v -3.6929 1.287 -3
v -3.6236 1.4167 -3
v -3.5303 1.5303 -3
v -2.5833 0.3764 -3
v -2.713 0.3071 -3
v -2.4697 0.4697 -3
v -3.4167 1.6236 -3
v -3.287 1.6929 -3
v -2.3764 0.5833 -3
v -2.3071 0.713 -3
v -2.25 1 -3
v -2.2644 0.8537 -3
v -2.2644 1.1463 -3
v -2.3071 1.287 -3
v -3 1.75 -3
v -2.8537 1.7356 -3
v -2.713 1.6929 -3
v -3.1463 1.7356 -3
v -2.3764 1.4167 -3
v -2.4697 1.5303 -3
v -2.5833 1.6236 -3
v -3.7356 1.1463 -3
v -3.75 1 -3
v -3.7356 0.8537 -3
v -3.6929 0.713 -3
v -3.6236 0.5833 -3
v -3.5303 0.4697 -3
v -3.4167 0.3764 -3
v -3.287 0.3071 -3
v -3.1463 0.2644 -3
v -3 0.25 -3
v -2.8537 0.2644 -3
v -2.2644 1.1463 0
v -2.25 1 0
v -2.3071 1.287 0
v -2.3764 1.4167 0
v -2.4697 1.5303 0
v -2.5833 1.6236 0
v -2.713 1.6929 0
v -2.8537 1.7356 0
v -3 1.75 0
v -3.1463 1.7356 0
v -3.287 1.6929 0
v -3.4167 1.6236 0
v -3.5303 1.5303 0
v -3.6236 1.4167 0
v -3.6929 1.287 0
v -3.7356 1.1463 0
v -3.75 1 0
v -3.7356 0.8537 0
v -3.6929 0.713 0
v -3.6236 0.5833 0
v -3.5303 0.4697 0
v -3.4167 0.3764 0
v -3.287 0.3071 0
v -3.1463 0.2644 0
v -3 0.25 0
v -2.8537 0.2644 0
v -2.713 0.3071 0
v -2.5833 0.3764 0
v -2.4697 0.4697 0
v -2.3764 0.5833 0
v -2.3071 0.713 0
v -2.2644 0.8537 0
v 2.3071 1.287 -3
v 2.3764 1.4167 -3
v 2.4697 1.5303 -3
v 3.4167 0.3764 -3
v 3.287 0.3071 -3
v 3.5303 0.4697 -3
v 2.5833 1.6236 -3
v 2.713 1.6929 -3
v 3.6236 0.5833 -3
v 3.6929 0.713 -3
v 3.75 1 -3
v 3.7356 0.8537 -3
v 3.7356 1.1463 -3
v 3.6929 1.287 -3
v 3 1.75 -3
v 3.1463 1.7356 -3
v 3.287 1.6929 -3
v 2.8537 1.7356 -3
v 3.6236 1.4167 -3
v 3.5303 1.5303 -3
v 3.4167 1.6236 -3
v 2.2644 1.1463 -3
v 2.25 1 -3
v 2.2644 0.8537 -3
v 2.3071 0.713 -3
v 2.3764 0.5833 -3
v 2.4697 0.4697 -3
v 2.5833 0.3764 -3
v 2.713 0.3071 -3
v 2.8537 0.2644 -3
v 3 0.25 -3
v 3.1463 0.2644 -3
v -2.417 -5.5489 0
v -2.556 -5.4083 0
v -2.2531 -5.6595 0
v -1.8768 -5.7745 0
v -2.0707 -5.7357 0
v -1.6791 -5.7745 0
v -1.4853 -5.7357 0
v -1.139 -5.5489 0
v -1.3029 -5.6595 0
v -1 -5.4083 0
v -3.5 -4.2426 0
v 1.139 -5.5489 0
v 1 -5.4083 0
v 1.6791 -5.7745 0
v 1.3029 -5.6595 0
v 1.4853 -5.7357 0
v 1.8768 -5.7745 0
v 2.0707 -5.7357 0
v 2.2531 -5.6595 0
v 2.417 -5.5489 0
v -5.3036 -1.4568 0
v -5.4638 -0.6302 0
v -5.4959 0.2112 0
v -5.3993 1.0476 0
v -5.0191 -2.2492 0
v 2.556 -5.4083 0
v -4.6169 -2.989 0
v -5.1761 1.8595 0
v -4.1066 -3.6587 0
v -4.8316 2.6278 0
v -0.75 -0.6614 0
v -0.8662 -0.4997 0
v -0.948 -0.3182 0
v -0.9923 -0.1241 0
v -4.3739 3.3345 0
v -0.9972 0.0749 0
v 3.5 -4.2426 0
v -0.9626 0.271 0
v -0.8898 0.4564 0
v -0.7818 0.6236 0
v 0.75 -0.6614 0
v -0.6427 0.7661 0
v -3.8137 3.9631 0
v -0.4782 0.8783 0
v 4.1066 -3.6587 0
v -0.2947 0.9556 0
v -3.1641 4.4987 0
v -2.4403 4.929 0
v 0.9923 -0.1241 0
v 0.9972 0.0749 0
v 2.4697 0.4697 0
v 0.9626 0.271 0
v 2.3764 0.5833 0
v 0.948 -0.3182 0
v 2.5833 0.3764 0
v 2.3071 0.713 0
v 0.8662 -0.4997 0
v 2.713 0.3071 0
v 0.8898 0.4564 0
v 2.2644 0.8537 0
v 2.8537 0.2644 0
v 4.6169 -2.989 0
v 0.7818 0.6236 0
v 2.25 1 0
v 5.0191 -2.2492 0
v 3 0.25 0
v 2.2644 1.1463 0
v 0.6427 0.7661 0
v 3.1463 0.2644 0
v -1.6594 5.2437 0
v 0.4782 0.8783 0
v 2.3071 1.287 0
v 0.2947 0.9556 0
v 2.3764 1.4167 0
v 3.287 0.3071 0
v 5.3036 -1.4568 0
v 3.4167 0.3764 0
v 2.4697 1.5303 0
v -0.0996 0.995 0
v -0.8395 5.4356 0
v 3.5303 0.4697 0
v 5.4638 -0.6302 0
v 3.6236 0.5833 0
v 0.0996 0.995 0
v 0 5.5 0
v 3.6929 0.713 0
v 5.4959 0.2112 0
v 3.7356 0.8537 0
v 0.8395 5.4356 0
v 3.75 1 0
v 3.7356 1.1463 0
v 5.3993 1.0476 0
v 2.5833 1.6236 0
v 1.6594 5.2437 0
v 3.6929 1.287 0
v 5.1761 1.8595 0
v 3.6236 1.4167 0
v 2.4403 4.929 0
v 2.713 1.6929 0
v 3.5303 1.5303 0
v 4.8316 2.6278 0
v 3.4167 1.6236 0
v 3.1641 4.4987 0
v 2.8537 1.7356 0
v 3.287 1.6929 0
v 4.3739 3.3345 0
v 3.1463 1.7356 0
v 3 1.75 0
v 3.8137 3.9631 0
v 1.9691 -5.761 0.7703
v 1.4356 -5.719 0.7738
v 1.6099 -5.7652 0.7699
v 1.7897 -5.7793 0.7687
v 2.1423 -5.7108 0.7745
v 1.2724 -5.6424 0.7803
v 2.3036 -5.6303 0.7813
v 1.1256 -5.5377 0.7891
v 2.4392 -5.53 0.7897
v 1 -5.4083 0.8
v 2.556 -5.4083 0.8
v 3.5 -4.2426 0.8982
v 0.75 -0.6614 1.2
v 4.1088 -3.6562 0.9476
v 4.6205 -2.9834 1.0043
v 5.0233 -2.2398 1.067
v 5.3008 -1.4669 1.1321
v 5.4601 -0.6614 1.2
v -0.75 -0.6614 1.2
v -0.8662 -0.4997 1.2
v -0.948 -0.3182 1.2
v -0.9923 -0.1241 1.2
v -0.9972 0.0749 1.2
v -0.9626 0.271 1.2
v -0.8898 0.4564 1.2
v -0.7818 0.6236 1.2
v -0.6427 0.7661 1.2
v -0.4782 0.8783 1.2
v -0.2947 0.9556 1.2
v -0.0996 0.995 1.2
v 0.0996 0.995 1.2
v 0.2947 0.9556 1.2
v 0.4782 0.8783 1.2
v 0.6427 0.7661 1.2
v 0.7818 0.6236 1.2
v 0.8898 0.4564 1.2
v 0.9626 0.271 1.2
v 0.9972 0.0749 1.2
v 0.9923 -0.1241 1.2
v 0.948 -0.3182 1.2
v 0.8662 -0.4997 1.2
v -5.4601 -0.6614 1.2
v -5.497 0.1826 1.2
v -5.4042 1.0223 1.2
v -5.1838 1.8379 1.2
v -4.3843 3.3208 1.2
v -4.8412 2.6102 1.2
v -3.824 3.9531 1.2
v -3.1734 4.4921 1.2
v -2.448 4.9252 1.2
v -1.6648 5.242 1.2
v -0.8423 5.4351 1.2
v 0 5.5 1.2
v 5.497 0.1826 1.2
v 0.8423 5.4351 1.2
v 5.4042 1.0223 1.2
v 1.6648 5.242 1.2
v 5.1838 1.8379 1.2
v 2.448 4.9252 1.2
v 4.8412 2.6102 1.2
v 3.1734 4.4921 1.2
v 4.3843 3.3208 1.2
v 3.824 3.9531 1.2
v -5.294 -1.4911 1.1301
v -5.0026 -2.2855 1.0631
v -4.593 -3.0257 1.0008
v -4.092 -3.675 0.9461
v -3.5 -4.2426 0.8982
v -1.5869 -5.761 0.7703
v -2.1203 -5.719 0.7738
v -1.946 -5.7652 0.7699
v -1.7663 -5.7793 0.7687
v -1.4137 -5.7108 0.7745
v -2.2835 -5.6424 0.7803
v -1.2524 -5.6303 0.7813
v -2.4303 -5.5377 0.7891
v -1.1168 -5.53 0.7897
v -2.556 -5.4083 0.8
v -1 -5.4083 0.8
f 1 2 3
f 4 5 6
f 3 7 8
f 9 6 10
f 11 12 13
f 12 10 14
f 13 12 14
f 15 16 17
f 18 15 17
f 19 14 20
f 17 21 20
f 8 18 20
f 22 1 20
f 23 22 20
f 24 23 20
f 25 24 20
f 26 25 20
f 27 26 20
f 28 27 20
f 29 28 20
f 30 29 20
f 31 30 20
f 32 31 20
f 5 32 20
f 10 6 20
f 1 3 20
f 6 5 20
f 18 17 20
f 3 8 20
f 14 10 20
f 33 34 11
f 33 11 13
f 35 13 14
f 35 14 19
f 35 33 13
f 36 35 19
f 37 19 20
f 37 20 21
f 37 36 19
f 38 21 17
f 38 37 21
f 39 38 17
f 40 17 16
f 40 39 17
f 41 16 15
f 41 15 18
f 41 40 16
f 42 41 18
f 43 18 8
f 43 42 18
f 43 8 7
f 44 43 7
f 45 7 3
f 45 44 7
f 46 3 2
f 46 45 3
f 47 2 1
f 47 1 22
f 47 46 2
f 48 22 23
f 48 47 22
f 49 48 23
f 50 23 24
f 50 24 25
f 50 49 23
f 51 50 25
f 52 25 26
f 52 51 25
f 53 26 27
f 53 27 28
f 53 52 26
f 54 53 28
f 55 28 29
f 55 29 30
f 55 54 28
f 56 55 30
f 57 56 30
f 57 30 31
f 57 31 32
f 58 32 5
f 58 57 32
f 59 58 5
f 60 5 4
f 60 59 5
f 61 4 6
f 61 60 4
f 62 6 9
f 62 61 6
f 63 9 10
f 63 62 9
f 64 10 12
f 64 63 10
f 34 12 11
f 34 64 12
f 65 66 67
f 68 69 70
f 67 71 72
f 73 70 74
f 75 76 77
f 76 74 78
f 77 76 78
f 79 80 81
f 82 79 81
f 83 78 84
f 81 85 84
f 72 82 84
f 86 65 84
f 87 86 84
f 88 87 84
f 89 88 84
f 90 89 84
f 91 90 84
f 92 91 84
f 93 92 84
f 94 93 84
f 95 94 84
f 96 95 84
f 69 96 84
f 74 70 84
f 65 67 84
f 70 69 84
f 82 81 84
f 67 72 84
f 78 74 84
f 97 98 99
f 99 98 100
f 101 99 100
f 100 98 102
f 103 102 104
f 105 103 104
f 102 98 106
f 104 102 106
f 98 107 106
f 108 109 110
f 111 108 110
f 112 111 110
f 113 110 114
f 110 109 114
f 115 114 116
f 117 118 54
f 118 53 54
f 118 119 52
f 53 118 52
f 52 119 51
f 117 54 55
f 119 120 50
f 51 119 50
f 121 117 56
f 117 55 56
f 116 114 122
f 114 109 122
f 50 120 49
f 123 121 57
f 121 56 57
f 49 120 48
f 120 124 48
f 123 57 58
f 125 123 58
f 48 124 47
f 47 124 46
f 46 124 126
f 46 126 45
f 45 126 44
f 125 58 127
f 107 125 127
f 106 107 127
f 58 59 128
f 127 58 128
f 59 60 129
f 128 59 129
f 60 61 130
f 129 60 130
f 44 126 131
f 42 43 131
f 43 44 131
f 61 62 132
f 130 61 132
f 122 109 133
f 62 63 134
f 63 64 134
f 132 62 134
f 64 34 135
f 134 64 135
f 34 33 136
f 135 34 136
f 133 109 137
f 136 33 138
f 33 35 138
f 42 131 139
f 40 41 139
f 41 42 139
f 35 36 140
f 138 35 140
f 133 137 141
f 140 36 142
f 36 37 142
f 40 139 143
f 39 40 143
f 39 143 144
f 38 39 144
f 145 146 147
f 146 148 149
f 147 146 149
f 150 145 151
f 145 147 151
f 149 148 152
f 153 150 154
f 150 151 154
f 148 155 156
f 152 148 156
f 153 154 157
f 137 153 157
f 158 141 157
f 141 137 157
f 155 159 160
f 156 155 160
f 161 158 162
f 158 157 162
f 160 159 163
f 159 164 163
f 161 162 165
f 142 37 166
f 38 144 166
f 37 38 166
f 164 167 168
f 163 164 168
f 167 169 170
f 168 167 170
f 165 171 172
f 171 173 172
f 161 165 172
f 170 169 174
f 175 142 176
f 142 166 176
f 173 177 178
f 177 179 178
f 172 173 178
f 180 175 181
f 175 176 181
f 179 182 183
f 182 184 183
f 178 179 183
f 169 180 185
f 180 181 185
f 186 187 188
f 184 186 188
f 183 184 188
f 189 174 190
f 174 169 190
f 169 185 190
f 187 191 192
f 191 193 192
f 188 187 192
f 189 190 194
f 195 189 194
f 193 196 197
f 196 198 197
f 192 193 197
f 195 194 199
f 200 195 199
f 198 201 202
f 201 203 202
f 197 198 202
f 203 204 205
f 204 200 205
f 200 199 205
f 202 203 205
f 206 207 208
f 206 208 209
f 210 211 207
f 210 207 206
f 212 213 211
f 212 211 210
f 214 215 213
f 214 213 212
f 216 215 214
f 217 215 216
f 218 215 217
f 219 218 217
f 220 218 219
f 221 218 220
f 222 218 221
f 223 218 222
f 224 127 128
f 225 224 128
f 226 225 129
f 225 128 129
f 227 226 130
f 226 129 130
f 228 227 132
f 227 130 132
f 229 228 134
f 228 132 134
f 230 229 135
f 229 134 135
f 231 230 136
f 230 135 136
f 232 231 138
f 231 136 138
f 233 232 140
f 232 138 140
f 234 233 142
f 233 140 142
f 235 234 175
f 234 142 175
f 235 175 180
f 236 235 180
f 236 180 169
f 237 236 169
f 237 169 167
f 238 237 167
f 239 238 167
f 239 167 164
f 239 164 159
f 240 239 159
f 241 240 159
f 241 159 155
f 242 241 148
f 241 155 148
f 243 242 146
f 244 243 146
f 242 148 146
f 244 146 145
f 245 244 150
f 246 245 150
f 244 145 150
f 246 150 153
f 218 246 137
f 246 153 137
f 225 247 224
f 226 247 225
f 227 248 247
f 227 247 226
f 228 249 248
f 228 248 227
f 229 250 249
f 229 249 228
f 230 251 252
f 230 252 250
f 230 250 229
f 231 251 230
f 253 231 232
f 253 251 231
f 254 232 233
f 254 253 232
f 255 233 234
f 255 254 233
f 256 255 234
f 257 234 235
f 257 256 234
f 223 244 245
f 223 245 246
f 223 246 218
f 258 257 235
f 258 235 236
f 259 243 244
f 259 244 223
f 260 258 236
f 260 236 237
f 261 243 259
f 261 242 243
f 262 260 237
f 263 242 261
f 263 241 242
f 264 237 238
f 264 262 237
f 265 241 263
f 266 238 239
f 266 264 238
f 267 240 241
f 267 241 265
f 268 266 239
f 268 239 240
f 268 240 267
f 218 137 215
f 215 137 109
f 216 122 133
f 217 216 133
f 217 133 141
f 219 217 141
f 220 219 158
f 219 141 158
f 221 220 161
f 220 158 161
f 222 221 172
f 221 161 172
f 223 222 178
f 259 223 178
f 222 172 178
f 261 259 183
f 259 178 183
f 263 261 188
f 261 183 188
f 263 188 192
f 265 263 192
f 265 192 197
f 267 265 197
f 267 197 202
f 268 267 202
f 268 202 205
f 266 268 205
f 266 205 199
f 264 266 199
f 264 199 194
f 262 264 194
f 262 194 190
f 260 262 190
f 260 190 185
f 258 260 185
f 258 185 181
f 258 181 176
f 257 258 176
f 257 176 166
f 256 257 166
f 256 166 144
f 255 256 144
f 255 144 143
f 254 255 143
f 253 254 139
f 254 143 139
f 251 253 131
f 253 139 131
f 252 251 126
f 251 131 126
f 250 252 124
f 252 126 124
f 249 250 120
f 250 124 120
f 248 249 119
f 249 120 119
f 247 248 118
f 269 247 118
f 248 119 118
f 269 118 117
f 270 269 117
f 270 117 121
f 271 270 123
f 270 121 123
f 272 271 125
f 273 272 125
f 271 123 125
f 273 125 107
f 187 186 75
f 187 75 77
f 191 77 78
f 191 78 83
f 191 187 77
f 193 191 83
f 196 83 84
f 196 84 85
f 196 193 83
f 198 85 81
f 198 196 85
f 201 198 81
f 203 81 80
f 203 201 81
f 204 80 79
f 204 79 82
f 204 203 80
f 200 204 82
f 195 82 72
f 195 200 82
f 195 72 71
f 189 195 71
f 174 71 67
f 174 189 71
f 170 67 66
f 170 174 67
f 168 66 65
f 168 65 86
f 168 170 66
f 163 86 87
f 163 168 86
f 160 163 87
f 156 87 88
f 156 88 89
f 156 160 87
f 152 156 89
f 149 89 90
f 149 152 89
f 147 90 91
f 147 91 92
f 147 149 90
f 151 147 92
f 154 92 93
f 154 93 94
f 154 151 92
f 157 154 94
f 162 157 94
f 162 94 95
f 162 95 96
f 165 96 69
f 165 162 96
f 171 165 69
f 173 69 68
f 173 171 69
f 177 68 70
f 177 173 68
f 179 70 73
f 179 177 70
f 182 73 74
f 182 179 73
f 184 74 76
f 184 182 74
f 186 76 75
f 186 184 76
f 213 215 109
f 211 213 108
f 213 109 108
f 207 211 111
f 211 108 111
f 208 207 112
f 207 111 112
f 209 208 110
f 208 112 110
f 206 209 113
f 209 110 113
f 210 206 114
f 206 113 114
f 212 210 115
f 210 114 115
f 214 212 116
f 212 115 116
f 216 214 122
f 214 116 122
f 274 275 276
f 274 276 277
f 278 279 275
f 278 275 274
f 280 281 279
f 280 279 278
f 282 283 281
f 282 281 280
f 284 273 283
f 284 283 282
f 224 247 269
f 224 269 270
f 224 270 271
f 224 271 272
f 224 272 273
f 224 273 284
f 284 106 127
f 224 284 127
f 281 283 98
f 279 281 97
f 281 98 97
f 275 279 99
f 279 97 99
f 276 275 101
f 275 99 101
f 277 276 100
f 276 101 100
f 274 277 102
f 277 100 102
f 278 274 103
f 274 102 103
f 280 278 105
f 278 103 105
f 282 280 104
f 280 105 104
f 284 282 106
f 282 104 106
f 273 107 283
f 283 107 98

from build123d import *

# Parameters (mm, degrees)
F1_DEPTH = 1.2
F2_R     = 0.75
F3_DEPTH = 3
F7_DEPTH = 18


# Not quite as in the source:
# - an extrude ends at something that could not be found from the text; its depth is read off the source's solid


with BuildPart() as f1:
    # F0 (on Top) → F1 (new body)
    with BuildSketch(Plane.XY):
        with BuildLine():
            ThreePointArc((-0.75, -0.6614378278), (0, 1), (0.75, -0.6614378278))
            Line((0.75, -0.6614378278), (1, -5.4083269132))
            ThreePointArc((1, -5.4083269132), (1.7779895069, -5.7793923244), (2.5559790138, -5.4083269132))
            Line((2.5559790138, -5.4083269132), (3.5, -4.2426406871))
            ThreePointArc((3.5, -4.2426406871), (0, 5.5), (-3.5, -4.2426406871))
            Line((-3.5, -4.2426406871), (-2.5559790138, -5.4083269132))
            ThreePointArc((-2.5559790138, -5.4083269132), (-1.7779895069, -5.7793923244), (-1, -5.4083269132))
            Line((-1, -5.4083269132), (-0.75, -0.6614378278))
        make_face()
    extrude(amount=F1_DEPTH)

    # F2 (on Top) → F3 (join)
    with BuildSketch(Plane.XY):
        with Locations((-3, 1)):
            Circle(F2_R)
        with Locations((3, 1)):
            Circle(F2_R)
    extrude(amount=-F3_DEPTH)

    # F6 (on 3pt) → F7 (cut, through all)
    with BuildSketch(Plane(origin=(0, -0.105069468, 1.2468827773), x_dir=(1, 0, 0), z_dir=(0, -0.0839681251, 0.996468441))):
        Polygon((0.75, -0.558340171), (-0.75, -0.558340171), (-5.460082417, -0.558340171), (-5.460082417, -5.9262430295), (5.460082417, -5.9262430295), (5.460082417, -0.558340171), align=None)
    extrude(amount=F7_DEPTH, mode=Mode.SUBTRACT)


solid = f1.part
